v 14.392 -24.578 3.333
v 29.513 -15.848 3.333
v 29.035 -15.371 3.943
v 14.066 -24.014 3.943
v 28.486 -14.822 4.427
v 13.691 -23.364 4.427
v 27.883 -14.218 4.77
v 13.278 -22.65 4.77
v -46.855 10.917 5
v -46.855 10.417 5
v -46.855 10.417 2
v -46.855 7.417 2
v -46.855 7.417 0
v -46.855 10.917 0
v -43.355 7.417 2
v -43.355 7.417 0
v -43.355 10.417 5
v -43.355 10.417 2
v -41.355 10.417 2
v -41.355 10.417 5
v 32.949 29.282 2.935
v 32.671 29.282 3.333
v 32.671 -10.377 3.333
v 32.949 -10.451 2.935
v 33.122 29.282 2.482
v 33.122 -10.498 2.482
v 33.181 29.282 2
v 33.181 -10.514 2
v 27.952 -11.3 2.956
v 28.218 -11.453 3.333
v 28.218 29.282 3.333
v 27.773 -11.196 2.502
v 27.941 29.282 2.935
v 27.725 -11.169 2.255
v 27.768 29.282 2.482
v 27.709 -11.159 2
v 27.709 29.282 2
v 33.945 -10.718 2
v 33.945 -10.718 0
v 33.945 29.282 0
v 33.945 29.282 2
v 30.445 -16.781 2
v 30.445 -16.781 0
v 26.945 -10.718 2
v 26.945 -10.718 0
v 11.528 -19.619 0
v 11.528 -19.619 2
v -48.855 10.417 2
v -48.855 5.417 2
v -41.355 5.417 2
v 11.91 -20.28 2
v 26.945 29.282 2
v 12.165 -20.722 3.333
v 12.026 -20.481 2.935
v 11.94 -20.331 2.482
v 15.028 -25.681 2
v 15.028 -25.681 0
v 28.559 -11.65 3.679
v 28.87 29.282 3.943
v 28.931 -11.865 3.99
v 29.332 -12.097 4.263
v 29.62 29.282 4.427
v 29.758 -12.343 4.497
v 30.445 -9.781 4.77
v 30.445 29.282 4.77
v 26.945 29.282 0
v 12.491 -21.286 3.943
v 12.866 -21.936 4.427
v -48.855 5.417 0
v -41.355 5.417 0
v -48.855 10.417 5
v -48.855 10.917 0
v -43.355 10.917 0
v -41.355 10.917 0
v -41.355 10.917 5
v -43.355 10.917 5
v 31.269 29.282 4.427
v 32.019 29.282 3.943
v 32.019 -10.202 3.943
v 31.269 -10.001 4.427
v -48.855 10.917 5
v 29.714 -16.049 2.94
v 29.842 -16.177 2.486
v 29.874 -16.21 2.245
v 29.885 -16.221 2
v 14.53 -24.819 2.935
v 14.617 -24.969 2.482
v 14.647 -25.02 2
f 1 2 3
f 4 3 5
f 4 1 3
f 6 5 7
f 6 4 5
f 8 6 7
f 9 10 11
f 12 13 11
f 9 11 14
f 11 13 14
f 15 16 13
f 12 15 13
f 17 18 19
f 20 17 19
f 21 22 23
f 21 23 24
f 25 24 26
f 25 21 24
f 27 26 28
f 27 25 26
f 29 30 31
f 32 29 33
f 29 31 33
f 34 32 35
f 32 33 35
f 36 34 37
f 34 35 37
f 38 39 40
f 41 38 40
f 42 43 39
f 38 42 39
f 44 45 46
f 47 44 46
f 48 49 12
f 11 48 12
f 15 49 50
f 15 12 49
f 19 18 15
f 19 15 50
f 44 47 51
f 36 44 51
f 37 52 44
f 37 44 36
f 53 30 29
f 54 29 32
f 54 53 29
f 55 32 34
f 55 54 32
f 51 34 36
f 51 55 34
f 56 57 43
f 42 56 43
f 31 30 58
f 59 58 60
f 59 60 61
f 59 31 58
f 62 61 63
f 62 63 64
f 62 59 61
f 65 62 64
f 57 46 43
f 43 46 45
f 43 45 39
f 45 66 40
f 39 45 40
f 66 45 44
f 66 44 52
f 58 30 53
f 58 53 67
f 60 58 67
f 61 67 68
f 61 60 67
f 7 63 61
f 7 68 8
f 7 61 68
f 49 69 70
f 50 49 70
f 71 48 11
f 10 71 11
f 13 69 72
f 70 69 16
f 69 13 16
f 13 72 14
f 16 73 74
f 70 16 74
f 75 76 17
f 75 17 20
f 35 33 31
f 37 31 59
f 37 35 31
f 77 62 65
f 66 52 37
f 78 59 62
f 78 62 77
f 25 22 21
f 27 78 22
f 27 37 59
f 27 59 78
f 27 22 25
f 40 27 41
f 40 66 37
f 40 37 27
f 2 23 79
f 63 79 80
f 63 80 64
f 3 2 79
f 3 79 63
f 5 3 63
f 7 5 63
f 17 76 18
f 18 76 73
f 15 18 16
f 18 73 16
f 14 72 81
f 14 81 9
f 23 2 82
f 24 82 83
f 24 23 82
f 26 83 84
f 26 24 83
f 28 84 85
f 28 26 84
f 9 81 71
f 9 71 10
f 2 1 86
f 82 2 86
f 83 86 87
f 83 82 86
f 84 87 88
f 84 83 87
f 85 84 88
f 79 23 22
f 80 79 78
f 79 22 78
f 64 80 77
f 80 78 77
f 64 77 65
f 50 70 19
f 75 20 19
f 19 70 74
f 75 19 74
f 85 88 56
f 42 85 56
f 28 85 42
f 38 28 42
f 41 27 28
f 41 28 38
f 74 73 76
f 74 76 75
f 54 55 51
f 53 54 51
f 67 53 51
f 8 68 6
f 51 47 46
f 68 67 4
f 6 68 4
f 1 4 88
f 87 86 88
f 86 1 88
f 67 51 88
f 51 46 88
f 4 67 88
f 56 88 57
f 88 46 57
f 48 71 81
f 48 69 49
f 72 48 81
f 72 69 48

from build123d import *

# Parameters (mm, degrees)
F0_W         = 7
F0_H         = 40
F1_DEPTH     = 5
F2_T1_DEPTH  = 32
F2_T3_DEPTH  = 42.8011414996
F2_T5_DEPTH  = 65
F2_T10_DEPTH = 65
F2_T15_DEPTH = 42.8011414996
F2_T21_DEPTH = 65
F2_T25_DEPTH = 42.8011414996
F3_R         = 2
F4_DEPTH     = 2
F0_W_2       = 2
F0_H_2       = 0.5
F5_DEPTH     = 5


# Not quite as in the source:
# - a fillet or chamfer that OpenCascade refuses, or shapes differently, is made with other operations: its cross-section is extruded or revolved along the edge and cut away or added


with BuildPart() as f1:
    # F0 (on Top) → F1 (new body)
    with BuildSketch(Plane.XY):
        Polygon((30.4447099417, -16.7805150867), (26.9447099417, -10.7183372602), (11.5284691868, -19.61890801), (15.0284691868, -25.6810858365), align=None)
        Polygon((33.9447099417, -10.7183372602), (26.9447099417, -10.7183372602), (30.4447099417, -16.7805150867), align=None)
        with Locations((30.4447099417, 9.2816627398)):
            Rectangle(F0_W, F0_H)
    extrude(amount=F1_DEPTH)

    # F2: fillet of radius 5 on 5 edges, made by hand

    # F2_s2 → F2_t1 (cut)
    with BuildSketch(Plane(origin=(-5.9049986914, -10.2277577521, 0), x_dir=(0, 0, 1), z_dir=(0.5, 0.8660254038, 0))):
        with BuildLine():
            ThreePointArc((0, 34.7561497637), (3.5355339059, 33.2916836697), (5, 29.7561497637))
            Line((5, 29.7561497637), (5, 34.7561497637))
            Line((5, 34.7561497637), (0, 34.7561497637))
        make_face()
    extrude(amount=F2_T1_DEPTH, mode=Mode.SUBTRACT)

    # F2_s4 → F2_t3 (cut)
    with BuildSketch(Plane(origin=(-10.6742020228, -6.1627534112, 0), x_dir=(0, 0, 1), z_dir=(0.8660254038, 0.5, 0))):
        with BuildLine():
            ThreePointArc((0, 29.7547073245), (3.5355339059, 28.2902412305), (5, 24.7547073245))
            Line((5, 24.7547073245), (5, 29.7547073245))
            Line((5, 29.7547073245), (0, 29.7547073245))
        make_face()
    extrude(amount=F2_T3_DEPTH, mode=Mode.SUBTRACT)

    # F2_s6 → F2_t5 (cut)
    with BuildSketch(Plane.XZ.offset(-41.7816627398)):
        with BuildLine():
            ThreePointArc((33.9447099417, 0), (32.4802438477, 3.5355339059), (28.9447099417, 5))
            Line((28.9447099417, 5), (33.9447099417, 5))
            Line((33.9447099417, 5), (33.9447099417, 0))
        make_face()
    extrude(amount=F2_T5_DEPTH, mode=Mode.SUBTRACT)


with BuildPart() as f2_tool8:
    # F2_s9 → F2_t10 (new body)
    with BuildSketch(Plane.XZ.offset(-41.7816627398)):
        with BuildLine():
            ThreePointArc((26.9447099417, 0), (28.4091760358, 3.5355339059), (31.9447099417, 5))
            Line((31.9447099417, 5), (26.9447099417, 5))
            Line((26.9447099417, 5), (26.9447099417, 0))
        make_face()
    extrude(amount=F2_T10_DEPTH)

    split(bisect_by=Plane(origin=(11.3773536623, -19.7061545987, 0), x_dir=(0, 0, 1), z_dir=(-0.5, 0.8660254038, 0)), keep=Keep.TOP)


with BuildPart() as f1_1:
    add(f1.part)

    # F2_t7: cut F2_tool8
    add(f2_tool8.part, mode=Mode.SUBTRACT)


with BuildPart() as f2_tool13:
    # F2_s14 → F2_t15 (new body)
    with BuildSketch(Plane(origin=(26.3926738268, 15.2378173385, 0), x_dir=(0, 0, 1), z_dir=(-0.8660254038, -0.5, 0))):
        with BuildLine():
            ThreePointArc((0, -22.7547073245), (3.5355339059, -24.2191734186), (5, -27.7547073245))
            Line((5, -27.7547073245), (5, -22.7547073245))
            Line((5, -22.7547073245), (0, -22.7547073245))
        make_face()
    extrude(amount=F2_T15_DEPTH)

    split(bisect_by=Plane.YZ.offset(26.9447099417), keep=Keep.BOTTOM)


with BuildPart() as f1_2:
    add(f1_1.part)

    # F2_t12: cut F2_tool13
    add(f2_tool13.part, mode=Mode.SUBTRACT)


with BuildPart() as f2_tool19:
    # F2_s20 → F2_t21 (new body)
    with BuildSketch(Plane.XZ.offset(-41.7816627398)):
        with BuildLine():
            ThreePointArc((26.9447099417, 0), (28.4091760358, 3.5355339059), (31.9447099417, 5))
            Line((31.9447099417, 5), (26.9447099417, 5))
            Line((26.9447099417, 5), (26.9447099417, 0))
        make_face()
    extrude(amount=F2_T21_DEPTH)

    split(bisect_by=Plane(origin=(11.3773536623, -19.7061545987, 0), x_dir=(0, 0, 1), z_dir=(0.5, -0.8660254038, 0)), keep=Keep.TOP)


with BuildPart() as f2_tool23:
    # F2_s24 → F2_t25 (new body)
    with BuildSketch(Plane(origin=(26.3926738268, 15.2378173385, 0), x_dir=(0, 0, 1), z_dir=(-0.8660254038, -0.5, 0))):
        with BuildLine():
            ThreePointArc((0, -22.7547073245), (3.5355339059, -24.2191734186), (5, -27.7547073245))
            Line((5, -27.7547073245), (5, -22.7547073245))
            Line((5, -22.7547073245), (0, -22.7547073245))
        make_face()
    extrude(amount=F2_T25_DEPTH)

    split(bisect_by=Plane.YZ.offset(26.9447099417), keep=Keep.TOP)


with BuildPart() as f2_tool19_1:
    add(f2_tool19.part)

    # F2_t27: intersect F2_tool23
    add(f2_tool23.part, mode=Mode.INTERSECT)


with BuildPart() as f1_3:
    add(f1_2.part)

    # F2_t17: cut F2_tool19
    add(f2_tool19_1.part, mode=Mode.SUBTRACT)

    # F3
    f3_edges = [f1_3.edges().sort_by_distance(p)[0] for p in [
        (13.278469, -22.649997, 0),
        (22.73659, -21.2308, 0),
        (19.23659, -15.168623, 0),
        (26.94471, 9.281663, 0),
        (33.94471, 9.281663, 0),
        (32.19471, -13.749426, 0),
        (30.44471, 29.281663, 0),
    ]]
    fillet(f3_edges, radius=F3_R)

    # F0 (on Top) → F4 (join)
    with BuildSketch(Plane.XY):
        with Locations((30.4447099417, 9.2816627398)):
            Rectangle(F0_W, F0_H)
        Polygon((30.4447099417, -16.7805150867), (26.9447099417, -10.7183372602), (11.5284691868, -19.61890801), (15.0284691868, -25.6810858365), align=None)
        Polygon((33.9447099417, -10.7183372602), (26.9447099417, -10.7183372602), (30.4447099417, -16.7805150867), align=None)
    extrude(amount=F4_DEPTH)


with BuildPart() as f4:
    # F0 (on Top) → F4, piece 2 (new body)
    with BuildSketch(Plane.XY):
        Polygon((-46.8554012775, 10.416974891), (-48.8554012775, 10.416974891), (-48.8554012775, 5.416974891), (-41.3554012775, 5.416974891), (-41.3554012775, 10.416974891), (-43.3554012775, 10.416974891), (-43.3554012775, 7.416974891), (-46.8554012775, 7.416974891), align=None)
    extrude(amount=F4_DEPTH)

    # F0 (on Top) → F5 (join)
    with BuildSketch(Plane.XY):
        with Locations((-47.8554012775, 10.666974891)):
            Rectangle(F0_W_2, F0_H_2)
        with Locations((-42.3554012775, 10.666974891)):
            Rectangle(F0_W_2, F0_H_2)
    extrude(amount=F5_DEPTH)


solid = Compound([f1_3.part, f4.part])
